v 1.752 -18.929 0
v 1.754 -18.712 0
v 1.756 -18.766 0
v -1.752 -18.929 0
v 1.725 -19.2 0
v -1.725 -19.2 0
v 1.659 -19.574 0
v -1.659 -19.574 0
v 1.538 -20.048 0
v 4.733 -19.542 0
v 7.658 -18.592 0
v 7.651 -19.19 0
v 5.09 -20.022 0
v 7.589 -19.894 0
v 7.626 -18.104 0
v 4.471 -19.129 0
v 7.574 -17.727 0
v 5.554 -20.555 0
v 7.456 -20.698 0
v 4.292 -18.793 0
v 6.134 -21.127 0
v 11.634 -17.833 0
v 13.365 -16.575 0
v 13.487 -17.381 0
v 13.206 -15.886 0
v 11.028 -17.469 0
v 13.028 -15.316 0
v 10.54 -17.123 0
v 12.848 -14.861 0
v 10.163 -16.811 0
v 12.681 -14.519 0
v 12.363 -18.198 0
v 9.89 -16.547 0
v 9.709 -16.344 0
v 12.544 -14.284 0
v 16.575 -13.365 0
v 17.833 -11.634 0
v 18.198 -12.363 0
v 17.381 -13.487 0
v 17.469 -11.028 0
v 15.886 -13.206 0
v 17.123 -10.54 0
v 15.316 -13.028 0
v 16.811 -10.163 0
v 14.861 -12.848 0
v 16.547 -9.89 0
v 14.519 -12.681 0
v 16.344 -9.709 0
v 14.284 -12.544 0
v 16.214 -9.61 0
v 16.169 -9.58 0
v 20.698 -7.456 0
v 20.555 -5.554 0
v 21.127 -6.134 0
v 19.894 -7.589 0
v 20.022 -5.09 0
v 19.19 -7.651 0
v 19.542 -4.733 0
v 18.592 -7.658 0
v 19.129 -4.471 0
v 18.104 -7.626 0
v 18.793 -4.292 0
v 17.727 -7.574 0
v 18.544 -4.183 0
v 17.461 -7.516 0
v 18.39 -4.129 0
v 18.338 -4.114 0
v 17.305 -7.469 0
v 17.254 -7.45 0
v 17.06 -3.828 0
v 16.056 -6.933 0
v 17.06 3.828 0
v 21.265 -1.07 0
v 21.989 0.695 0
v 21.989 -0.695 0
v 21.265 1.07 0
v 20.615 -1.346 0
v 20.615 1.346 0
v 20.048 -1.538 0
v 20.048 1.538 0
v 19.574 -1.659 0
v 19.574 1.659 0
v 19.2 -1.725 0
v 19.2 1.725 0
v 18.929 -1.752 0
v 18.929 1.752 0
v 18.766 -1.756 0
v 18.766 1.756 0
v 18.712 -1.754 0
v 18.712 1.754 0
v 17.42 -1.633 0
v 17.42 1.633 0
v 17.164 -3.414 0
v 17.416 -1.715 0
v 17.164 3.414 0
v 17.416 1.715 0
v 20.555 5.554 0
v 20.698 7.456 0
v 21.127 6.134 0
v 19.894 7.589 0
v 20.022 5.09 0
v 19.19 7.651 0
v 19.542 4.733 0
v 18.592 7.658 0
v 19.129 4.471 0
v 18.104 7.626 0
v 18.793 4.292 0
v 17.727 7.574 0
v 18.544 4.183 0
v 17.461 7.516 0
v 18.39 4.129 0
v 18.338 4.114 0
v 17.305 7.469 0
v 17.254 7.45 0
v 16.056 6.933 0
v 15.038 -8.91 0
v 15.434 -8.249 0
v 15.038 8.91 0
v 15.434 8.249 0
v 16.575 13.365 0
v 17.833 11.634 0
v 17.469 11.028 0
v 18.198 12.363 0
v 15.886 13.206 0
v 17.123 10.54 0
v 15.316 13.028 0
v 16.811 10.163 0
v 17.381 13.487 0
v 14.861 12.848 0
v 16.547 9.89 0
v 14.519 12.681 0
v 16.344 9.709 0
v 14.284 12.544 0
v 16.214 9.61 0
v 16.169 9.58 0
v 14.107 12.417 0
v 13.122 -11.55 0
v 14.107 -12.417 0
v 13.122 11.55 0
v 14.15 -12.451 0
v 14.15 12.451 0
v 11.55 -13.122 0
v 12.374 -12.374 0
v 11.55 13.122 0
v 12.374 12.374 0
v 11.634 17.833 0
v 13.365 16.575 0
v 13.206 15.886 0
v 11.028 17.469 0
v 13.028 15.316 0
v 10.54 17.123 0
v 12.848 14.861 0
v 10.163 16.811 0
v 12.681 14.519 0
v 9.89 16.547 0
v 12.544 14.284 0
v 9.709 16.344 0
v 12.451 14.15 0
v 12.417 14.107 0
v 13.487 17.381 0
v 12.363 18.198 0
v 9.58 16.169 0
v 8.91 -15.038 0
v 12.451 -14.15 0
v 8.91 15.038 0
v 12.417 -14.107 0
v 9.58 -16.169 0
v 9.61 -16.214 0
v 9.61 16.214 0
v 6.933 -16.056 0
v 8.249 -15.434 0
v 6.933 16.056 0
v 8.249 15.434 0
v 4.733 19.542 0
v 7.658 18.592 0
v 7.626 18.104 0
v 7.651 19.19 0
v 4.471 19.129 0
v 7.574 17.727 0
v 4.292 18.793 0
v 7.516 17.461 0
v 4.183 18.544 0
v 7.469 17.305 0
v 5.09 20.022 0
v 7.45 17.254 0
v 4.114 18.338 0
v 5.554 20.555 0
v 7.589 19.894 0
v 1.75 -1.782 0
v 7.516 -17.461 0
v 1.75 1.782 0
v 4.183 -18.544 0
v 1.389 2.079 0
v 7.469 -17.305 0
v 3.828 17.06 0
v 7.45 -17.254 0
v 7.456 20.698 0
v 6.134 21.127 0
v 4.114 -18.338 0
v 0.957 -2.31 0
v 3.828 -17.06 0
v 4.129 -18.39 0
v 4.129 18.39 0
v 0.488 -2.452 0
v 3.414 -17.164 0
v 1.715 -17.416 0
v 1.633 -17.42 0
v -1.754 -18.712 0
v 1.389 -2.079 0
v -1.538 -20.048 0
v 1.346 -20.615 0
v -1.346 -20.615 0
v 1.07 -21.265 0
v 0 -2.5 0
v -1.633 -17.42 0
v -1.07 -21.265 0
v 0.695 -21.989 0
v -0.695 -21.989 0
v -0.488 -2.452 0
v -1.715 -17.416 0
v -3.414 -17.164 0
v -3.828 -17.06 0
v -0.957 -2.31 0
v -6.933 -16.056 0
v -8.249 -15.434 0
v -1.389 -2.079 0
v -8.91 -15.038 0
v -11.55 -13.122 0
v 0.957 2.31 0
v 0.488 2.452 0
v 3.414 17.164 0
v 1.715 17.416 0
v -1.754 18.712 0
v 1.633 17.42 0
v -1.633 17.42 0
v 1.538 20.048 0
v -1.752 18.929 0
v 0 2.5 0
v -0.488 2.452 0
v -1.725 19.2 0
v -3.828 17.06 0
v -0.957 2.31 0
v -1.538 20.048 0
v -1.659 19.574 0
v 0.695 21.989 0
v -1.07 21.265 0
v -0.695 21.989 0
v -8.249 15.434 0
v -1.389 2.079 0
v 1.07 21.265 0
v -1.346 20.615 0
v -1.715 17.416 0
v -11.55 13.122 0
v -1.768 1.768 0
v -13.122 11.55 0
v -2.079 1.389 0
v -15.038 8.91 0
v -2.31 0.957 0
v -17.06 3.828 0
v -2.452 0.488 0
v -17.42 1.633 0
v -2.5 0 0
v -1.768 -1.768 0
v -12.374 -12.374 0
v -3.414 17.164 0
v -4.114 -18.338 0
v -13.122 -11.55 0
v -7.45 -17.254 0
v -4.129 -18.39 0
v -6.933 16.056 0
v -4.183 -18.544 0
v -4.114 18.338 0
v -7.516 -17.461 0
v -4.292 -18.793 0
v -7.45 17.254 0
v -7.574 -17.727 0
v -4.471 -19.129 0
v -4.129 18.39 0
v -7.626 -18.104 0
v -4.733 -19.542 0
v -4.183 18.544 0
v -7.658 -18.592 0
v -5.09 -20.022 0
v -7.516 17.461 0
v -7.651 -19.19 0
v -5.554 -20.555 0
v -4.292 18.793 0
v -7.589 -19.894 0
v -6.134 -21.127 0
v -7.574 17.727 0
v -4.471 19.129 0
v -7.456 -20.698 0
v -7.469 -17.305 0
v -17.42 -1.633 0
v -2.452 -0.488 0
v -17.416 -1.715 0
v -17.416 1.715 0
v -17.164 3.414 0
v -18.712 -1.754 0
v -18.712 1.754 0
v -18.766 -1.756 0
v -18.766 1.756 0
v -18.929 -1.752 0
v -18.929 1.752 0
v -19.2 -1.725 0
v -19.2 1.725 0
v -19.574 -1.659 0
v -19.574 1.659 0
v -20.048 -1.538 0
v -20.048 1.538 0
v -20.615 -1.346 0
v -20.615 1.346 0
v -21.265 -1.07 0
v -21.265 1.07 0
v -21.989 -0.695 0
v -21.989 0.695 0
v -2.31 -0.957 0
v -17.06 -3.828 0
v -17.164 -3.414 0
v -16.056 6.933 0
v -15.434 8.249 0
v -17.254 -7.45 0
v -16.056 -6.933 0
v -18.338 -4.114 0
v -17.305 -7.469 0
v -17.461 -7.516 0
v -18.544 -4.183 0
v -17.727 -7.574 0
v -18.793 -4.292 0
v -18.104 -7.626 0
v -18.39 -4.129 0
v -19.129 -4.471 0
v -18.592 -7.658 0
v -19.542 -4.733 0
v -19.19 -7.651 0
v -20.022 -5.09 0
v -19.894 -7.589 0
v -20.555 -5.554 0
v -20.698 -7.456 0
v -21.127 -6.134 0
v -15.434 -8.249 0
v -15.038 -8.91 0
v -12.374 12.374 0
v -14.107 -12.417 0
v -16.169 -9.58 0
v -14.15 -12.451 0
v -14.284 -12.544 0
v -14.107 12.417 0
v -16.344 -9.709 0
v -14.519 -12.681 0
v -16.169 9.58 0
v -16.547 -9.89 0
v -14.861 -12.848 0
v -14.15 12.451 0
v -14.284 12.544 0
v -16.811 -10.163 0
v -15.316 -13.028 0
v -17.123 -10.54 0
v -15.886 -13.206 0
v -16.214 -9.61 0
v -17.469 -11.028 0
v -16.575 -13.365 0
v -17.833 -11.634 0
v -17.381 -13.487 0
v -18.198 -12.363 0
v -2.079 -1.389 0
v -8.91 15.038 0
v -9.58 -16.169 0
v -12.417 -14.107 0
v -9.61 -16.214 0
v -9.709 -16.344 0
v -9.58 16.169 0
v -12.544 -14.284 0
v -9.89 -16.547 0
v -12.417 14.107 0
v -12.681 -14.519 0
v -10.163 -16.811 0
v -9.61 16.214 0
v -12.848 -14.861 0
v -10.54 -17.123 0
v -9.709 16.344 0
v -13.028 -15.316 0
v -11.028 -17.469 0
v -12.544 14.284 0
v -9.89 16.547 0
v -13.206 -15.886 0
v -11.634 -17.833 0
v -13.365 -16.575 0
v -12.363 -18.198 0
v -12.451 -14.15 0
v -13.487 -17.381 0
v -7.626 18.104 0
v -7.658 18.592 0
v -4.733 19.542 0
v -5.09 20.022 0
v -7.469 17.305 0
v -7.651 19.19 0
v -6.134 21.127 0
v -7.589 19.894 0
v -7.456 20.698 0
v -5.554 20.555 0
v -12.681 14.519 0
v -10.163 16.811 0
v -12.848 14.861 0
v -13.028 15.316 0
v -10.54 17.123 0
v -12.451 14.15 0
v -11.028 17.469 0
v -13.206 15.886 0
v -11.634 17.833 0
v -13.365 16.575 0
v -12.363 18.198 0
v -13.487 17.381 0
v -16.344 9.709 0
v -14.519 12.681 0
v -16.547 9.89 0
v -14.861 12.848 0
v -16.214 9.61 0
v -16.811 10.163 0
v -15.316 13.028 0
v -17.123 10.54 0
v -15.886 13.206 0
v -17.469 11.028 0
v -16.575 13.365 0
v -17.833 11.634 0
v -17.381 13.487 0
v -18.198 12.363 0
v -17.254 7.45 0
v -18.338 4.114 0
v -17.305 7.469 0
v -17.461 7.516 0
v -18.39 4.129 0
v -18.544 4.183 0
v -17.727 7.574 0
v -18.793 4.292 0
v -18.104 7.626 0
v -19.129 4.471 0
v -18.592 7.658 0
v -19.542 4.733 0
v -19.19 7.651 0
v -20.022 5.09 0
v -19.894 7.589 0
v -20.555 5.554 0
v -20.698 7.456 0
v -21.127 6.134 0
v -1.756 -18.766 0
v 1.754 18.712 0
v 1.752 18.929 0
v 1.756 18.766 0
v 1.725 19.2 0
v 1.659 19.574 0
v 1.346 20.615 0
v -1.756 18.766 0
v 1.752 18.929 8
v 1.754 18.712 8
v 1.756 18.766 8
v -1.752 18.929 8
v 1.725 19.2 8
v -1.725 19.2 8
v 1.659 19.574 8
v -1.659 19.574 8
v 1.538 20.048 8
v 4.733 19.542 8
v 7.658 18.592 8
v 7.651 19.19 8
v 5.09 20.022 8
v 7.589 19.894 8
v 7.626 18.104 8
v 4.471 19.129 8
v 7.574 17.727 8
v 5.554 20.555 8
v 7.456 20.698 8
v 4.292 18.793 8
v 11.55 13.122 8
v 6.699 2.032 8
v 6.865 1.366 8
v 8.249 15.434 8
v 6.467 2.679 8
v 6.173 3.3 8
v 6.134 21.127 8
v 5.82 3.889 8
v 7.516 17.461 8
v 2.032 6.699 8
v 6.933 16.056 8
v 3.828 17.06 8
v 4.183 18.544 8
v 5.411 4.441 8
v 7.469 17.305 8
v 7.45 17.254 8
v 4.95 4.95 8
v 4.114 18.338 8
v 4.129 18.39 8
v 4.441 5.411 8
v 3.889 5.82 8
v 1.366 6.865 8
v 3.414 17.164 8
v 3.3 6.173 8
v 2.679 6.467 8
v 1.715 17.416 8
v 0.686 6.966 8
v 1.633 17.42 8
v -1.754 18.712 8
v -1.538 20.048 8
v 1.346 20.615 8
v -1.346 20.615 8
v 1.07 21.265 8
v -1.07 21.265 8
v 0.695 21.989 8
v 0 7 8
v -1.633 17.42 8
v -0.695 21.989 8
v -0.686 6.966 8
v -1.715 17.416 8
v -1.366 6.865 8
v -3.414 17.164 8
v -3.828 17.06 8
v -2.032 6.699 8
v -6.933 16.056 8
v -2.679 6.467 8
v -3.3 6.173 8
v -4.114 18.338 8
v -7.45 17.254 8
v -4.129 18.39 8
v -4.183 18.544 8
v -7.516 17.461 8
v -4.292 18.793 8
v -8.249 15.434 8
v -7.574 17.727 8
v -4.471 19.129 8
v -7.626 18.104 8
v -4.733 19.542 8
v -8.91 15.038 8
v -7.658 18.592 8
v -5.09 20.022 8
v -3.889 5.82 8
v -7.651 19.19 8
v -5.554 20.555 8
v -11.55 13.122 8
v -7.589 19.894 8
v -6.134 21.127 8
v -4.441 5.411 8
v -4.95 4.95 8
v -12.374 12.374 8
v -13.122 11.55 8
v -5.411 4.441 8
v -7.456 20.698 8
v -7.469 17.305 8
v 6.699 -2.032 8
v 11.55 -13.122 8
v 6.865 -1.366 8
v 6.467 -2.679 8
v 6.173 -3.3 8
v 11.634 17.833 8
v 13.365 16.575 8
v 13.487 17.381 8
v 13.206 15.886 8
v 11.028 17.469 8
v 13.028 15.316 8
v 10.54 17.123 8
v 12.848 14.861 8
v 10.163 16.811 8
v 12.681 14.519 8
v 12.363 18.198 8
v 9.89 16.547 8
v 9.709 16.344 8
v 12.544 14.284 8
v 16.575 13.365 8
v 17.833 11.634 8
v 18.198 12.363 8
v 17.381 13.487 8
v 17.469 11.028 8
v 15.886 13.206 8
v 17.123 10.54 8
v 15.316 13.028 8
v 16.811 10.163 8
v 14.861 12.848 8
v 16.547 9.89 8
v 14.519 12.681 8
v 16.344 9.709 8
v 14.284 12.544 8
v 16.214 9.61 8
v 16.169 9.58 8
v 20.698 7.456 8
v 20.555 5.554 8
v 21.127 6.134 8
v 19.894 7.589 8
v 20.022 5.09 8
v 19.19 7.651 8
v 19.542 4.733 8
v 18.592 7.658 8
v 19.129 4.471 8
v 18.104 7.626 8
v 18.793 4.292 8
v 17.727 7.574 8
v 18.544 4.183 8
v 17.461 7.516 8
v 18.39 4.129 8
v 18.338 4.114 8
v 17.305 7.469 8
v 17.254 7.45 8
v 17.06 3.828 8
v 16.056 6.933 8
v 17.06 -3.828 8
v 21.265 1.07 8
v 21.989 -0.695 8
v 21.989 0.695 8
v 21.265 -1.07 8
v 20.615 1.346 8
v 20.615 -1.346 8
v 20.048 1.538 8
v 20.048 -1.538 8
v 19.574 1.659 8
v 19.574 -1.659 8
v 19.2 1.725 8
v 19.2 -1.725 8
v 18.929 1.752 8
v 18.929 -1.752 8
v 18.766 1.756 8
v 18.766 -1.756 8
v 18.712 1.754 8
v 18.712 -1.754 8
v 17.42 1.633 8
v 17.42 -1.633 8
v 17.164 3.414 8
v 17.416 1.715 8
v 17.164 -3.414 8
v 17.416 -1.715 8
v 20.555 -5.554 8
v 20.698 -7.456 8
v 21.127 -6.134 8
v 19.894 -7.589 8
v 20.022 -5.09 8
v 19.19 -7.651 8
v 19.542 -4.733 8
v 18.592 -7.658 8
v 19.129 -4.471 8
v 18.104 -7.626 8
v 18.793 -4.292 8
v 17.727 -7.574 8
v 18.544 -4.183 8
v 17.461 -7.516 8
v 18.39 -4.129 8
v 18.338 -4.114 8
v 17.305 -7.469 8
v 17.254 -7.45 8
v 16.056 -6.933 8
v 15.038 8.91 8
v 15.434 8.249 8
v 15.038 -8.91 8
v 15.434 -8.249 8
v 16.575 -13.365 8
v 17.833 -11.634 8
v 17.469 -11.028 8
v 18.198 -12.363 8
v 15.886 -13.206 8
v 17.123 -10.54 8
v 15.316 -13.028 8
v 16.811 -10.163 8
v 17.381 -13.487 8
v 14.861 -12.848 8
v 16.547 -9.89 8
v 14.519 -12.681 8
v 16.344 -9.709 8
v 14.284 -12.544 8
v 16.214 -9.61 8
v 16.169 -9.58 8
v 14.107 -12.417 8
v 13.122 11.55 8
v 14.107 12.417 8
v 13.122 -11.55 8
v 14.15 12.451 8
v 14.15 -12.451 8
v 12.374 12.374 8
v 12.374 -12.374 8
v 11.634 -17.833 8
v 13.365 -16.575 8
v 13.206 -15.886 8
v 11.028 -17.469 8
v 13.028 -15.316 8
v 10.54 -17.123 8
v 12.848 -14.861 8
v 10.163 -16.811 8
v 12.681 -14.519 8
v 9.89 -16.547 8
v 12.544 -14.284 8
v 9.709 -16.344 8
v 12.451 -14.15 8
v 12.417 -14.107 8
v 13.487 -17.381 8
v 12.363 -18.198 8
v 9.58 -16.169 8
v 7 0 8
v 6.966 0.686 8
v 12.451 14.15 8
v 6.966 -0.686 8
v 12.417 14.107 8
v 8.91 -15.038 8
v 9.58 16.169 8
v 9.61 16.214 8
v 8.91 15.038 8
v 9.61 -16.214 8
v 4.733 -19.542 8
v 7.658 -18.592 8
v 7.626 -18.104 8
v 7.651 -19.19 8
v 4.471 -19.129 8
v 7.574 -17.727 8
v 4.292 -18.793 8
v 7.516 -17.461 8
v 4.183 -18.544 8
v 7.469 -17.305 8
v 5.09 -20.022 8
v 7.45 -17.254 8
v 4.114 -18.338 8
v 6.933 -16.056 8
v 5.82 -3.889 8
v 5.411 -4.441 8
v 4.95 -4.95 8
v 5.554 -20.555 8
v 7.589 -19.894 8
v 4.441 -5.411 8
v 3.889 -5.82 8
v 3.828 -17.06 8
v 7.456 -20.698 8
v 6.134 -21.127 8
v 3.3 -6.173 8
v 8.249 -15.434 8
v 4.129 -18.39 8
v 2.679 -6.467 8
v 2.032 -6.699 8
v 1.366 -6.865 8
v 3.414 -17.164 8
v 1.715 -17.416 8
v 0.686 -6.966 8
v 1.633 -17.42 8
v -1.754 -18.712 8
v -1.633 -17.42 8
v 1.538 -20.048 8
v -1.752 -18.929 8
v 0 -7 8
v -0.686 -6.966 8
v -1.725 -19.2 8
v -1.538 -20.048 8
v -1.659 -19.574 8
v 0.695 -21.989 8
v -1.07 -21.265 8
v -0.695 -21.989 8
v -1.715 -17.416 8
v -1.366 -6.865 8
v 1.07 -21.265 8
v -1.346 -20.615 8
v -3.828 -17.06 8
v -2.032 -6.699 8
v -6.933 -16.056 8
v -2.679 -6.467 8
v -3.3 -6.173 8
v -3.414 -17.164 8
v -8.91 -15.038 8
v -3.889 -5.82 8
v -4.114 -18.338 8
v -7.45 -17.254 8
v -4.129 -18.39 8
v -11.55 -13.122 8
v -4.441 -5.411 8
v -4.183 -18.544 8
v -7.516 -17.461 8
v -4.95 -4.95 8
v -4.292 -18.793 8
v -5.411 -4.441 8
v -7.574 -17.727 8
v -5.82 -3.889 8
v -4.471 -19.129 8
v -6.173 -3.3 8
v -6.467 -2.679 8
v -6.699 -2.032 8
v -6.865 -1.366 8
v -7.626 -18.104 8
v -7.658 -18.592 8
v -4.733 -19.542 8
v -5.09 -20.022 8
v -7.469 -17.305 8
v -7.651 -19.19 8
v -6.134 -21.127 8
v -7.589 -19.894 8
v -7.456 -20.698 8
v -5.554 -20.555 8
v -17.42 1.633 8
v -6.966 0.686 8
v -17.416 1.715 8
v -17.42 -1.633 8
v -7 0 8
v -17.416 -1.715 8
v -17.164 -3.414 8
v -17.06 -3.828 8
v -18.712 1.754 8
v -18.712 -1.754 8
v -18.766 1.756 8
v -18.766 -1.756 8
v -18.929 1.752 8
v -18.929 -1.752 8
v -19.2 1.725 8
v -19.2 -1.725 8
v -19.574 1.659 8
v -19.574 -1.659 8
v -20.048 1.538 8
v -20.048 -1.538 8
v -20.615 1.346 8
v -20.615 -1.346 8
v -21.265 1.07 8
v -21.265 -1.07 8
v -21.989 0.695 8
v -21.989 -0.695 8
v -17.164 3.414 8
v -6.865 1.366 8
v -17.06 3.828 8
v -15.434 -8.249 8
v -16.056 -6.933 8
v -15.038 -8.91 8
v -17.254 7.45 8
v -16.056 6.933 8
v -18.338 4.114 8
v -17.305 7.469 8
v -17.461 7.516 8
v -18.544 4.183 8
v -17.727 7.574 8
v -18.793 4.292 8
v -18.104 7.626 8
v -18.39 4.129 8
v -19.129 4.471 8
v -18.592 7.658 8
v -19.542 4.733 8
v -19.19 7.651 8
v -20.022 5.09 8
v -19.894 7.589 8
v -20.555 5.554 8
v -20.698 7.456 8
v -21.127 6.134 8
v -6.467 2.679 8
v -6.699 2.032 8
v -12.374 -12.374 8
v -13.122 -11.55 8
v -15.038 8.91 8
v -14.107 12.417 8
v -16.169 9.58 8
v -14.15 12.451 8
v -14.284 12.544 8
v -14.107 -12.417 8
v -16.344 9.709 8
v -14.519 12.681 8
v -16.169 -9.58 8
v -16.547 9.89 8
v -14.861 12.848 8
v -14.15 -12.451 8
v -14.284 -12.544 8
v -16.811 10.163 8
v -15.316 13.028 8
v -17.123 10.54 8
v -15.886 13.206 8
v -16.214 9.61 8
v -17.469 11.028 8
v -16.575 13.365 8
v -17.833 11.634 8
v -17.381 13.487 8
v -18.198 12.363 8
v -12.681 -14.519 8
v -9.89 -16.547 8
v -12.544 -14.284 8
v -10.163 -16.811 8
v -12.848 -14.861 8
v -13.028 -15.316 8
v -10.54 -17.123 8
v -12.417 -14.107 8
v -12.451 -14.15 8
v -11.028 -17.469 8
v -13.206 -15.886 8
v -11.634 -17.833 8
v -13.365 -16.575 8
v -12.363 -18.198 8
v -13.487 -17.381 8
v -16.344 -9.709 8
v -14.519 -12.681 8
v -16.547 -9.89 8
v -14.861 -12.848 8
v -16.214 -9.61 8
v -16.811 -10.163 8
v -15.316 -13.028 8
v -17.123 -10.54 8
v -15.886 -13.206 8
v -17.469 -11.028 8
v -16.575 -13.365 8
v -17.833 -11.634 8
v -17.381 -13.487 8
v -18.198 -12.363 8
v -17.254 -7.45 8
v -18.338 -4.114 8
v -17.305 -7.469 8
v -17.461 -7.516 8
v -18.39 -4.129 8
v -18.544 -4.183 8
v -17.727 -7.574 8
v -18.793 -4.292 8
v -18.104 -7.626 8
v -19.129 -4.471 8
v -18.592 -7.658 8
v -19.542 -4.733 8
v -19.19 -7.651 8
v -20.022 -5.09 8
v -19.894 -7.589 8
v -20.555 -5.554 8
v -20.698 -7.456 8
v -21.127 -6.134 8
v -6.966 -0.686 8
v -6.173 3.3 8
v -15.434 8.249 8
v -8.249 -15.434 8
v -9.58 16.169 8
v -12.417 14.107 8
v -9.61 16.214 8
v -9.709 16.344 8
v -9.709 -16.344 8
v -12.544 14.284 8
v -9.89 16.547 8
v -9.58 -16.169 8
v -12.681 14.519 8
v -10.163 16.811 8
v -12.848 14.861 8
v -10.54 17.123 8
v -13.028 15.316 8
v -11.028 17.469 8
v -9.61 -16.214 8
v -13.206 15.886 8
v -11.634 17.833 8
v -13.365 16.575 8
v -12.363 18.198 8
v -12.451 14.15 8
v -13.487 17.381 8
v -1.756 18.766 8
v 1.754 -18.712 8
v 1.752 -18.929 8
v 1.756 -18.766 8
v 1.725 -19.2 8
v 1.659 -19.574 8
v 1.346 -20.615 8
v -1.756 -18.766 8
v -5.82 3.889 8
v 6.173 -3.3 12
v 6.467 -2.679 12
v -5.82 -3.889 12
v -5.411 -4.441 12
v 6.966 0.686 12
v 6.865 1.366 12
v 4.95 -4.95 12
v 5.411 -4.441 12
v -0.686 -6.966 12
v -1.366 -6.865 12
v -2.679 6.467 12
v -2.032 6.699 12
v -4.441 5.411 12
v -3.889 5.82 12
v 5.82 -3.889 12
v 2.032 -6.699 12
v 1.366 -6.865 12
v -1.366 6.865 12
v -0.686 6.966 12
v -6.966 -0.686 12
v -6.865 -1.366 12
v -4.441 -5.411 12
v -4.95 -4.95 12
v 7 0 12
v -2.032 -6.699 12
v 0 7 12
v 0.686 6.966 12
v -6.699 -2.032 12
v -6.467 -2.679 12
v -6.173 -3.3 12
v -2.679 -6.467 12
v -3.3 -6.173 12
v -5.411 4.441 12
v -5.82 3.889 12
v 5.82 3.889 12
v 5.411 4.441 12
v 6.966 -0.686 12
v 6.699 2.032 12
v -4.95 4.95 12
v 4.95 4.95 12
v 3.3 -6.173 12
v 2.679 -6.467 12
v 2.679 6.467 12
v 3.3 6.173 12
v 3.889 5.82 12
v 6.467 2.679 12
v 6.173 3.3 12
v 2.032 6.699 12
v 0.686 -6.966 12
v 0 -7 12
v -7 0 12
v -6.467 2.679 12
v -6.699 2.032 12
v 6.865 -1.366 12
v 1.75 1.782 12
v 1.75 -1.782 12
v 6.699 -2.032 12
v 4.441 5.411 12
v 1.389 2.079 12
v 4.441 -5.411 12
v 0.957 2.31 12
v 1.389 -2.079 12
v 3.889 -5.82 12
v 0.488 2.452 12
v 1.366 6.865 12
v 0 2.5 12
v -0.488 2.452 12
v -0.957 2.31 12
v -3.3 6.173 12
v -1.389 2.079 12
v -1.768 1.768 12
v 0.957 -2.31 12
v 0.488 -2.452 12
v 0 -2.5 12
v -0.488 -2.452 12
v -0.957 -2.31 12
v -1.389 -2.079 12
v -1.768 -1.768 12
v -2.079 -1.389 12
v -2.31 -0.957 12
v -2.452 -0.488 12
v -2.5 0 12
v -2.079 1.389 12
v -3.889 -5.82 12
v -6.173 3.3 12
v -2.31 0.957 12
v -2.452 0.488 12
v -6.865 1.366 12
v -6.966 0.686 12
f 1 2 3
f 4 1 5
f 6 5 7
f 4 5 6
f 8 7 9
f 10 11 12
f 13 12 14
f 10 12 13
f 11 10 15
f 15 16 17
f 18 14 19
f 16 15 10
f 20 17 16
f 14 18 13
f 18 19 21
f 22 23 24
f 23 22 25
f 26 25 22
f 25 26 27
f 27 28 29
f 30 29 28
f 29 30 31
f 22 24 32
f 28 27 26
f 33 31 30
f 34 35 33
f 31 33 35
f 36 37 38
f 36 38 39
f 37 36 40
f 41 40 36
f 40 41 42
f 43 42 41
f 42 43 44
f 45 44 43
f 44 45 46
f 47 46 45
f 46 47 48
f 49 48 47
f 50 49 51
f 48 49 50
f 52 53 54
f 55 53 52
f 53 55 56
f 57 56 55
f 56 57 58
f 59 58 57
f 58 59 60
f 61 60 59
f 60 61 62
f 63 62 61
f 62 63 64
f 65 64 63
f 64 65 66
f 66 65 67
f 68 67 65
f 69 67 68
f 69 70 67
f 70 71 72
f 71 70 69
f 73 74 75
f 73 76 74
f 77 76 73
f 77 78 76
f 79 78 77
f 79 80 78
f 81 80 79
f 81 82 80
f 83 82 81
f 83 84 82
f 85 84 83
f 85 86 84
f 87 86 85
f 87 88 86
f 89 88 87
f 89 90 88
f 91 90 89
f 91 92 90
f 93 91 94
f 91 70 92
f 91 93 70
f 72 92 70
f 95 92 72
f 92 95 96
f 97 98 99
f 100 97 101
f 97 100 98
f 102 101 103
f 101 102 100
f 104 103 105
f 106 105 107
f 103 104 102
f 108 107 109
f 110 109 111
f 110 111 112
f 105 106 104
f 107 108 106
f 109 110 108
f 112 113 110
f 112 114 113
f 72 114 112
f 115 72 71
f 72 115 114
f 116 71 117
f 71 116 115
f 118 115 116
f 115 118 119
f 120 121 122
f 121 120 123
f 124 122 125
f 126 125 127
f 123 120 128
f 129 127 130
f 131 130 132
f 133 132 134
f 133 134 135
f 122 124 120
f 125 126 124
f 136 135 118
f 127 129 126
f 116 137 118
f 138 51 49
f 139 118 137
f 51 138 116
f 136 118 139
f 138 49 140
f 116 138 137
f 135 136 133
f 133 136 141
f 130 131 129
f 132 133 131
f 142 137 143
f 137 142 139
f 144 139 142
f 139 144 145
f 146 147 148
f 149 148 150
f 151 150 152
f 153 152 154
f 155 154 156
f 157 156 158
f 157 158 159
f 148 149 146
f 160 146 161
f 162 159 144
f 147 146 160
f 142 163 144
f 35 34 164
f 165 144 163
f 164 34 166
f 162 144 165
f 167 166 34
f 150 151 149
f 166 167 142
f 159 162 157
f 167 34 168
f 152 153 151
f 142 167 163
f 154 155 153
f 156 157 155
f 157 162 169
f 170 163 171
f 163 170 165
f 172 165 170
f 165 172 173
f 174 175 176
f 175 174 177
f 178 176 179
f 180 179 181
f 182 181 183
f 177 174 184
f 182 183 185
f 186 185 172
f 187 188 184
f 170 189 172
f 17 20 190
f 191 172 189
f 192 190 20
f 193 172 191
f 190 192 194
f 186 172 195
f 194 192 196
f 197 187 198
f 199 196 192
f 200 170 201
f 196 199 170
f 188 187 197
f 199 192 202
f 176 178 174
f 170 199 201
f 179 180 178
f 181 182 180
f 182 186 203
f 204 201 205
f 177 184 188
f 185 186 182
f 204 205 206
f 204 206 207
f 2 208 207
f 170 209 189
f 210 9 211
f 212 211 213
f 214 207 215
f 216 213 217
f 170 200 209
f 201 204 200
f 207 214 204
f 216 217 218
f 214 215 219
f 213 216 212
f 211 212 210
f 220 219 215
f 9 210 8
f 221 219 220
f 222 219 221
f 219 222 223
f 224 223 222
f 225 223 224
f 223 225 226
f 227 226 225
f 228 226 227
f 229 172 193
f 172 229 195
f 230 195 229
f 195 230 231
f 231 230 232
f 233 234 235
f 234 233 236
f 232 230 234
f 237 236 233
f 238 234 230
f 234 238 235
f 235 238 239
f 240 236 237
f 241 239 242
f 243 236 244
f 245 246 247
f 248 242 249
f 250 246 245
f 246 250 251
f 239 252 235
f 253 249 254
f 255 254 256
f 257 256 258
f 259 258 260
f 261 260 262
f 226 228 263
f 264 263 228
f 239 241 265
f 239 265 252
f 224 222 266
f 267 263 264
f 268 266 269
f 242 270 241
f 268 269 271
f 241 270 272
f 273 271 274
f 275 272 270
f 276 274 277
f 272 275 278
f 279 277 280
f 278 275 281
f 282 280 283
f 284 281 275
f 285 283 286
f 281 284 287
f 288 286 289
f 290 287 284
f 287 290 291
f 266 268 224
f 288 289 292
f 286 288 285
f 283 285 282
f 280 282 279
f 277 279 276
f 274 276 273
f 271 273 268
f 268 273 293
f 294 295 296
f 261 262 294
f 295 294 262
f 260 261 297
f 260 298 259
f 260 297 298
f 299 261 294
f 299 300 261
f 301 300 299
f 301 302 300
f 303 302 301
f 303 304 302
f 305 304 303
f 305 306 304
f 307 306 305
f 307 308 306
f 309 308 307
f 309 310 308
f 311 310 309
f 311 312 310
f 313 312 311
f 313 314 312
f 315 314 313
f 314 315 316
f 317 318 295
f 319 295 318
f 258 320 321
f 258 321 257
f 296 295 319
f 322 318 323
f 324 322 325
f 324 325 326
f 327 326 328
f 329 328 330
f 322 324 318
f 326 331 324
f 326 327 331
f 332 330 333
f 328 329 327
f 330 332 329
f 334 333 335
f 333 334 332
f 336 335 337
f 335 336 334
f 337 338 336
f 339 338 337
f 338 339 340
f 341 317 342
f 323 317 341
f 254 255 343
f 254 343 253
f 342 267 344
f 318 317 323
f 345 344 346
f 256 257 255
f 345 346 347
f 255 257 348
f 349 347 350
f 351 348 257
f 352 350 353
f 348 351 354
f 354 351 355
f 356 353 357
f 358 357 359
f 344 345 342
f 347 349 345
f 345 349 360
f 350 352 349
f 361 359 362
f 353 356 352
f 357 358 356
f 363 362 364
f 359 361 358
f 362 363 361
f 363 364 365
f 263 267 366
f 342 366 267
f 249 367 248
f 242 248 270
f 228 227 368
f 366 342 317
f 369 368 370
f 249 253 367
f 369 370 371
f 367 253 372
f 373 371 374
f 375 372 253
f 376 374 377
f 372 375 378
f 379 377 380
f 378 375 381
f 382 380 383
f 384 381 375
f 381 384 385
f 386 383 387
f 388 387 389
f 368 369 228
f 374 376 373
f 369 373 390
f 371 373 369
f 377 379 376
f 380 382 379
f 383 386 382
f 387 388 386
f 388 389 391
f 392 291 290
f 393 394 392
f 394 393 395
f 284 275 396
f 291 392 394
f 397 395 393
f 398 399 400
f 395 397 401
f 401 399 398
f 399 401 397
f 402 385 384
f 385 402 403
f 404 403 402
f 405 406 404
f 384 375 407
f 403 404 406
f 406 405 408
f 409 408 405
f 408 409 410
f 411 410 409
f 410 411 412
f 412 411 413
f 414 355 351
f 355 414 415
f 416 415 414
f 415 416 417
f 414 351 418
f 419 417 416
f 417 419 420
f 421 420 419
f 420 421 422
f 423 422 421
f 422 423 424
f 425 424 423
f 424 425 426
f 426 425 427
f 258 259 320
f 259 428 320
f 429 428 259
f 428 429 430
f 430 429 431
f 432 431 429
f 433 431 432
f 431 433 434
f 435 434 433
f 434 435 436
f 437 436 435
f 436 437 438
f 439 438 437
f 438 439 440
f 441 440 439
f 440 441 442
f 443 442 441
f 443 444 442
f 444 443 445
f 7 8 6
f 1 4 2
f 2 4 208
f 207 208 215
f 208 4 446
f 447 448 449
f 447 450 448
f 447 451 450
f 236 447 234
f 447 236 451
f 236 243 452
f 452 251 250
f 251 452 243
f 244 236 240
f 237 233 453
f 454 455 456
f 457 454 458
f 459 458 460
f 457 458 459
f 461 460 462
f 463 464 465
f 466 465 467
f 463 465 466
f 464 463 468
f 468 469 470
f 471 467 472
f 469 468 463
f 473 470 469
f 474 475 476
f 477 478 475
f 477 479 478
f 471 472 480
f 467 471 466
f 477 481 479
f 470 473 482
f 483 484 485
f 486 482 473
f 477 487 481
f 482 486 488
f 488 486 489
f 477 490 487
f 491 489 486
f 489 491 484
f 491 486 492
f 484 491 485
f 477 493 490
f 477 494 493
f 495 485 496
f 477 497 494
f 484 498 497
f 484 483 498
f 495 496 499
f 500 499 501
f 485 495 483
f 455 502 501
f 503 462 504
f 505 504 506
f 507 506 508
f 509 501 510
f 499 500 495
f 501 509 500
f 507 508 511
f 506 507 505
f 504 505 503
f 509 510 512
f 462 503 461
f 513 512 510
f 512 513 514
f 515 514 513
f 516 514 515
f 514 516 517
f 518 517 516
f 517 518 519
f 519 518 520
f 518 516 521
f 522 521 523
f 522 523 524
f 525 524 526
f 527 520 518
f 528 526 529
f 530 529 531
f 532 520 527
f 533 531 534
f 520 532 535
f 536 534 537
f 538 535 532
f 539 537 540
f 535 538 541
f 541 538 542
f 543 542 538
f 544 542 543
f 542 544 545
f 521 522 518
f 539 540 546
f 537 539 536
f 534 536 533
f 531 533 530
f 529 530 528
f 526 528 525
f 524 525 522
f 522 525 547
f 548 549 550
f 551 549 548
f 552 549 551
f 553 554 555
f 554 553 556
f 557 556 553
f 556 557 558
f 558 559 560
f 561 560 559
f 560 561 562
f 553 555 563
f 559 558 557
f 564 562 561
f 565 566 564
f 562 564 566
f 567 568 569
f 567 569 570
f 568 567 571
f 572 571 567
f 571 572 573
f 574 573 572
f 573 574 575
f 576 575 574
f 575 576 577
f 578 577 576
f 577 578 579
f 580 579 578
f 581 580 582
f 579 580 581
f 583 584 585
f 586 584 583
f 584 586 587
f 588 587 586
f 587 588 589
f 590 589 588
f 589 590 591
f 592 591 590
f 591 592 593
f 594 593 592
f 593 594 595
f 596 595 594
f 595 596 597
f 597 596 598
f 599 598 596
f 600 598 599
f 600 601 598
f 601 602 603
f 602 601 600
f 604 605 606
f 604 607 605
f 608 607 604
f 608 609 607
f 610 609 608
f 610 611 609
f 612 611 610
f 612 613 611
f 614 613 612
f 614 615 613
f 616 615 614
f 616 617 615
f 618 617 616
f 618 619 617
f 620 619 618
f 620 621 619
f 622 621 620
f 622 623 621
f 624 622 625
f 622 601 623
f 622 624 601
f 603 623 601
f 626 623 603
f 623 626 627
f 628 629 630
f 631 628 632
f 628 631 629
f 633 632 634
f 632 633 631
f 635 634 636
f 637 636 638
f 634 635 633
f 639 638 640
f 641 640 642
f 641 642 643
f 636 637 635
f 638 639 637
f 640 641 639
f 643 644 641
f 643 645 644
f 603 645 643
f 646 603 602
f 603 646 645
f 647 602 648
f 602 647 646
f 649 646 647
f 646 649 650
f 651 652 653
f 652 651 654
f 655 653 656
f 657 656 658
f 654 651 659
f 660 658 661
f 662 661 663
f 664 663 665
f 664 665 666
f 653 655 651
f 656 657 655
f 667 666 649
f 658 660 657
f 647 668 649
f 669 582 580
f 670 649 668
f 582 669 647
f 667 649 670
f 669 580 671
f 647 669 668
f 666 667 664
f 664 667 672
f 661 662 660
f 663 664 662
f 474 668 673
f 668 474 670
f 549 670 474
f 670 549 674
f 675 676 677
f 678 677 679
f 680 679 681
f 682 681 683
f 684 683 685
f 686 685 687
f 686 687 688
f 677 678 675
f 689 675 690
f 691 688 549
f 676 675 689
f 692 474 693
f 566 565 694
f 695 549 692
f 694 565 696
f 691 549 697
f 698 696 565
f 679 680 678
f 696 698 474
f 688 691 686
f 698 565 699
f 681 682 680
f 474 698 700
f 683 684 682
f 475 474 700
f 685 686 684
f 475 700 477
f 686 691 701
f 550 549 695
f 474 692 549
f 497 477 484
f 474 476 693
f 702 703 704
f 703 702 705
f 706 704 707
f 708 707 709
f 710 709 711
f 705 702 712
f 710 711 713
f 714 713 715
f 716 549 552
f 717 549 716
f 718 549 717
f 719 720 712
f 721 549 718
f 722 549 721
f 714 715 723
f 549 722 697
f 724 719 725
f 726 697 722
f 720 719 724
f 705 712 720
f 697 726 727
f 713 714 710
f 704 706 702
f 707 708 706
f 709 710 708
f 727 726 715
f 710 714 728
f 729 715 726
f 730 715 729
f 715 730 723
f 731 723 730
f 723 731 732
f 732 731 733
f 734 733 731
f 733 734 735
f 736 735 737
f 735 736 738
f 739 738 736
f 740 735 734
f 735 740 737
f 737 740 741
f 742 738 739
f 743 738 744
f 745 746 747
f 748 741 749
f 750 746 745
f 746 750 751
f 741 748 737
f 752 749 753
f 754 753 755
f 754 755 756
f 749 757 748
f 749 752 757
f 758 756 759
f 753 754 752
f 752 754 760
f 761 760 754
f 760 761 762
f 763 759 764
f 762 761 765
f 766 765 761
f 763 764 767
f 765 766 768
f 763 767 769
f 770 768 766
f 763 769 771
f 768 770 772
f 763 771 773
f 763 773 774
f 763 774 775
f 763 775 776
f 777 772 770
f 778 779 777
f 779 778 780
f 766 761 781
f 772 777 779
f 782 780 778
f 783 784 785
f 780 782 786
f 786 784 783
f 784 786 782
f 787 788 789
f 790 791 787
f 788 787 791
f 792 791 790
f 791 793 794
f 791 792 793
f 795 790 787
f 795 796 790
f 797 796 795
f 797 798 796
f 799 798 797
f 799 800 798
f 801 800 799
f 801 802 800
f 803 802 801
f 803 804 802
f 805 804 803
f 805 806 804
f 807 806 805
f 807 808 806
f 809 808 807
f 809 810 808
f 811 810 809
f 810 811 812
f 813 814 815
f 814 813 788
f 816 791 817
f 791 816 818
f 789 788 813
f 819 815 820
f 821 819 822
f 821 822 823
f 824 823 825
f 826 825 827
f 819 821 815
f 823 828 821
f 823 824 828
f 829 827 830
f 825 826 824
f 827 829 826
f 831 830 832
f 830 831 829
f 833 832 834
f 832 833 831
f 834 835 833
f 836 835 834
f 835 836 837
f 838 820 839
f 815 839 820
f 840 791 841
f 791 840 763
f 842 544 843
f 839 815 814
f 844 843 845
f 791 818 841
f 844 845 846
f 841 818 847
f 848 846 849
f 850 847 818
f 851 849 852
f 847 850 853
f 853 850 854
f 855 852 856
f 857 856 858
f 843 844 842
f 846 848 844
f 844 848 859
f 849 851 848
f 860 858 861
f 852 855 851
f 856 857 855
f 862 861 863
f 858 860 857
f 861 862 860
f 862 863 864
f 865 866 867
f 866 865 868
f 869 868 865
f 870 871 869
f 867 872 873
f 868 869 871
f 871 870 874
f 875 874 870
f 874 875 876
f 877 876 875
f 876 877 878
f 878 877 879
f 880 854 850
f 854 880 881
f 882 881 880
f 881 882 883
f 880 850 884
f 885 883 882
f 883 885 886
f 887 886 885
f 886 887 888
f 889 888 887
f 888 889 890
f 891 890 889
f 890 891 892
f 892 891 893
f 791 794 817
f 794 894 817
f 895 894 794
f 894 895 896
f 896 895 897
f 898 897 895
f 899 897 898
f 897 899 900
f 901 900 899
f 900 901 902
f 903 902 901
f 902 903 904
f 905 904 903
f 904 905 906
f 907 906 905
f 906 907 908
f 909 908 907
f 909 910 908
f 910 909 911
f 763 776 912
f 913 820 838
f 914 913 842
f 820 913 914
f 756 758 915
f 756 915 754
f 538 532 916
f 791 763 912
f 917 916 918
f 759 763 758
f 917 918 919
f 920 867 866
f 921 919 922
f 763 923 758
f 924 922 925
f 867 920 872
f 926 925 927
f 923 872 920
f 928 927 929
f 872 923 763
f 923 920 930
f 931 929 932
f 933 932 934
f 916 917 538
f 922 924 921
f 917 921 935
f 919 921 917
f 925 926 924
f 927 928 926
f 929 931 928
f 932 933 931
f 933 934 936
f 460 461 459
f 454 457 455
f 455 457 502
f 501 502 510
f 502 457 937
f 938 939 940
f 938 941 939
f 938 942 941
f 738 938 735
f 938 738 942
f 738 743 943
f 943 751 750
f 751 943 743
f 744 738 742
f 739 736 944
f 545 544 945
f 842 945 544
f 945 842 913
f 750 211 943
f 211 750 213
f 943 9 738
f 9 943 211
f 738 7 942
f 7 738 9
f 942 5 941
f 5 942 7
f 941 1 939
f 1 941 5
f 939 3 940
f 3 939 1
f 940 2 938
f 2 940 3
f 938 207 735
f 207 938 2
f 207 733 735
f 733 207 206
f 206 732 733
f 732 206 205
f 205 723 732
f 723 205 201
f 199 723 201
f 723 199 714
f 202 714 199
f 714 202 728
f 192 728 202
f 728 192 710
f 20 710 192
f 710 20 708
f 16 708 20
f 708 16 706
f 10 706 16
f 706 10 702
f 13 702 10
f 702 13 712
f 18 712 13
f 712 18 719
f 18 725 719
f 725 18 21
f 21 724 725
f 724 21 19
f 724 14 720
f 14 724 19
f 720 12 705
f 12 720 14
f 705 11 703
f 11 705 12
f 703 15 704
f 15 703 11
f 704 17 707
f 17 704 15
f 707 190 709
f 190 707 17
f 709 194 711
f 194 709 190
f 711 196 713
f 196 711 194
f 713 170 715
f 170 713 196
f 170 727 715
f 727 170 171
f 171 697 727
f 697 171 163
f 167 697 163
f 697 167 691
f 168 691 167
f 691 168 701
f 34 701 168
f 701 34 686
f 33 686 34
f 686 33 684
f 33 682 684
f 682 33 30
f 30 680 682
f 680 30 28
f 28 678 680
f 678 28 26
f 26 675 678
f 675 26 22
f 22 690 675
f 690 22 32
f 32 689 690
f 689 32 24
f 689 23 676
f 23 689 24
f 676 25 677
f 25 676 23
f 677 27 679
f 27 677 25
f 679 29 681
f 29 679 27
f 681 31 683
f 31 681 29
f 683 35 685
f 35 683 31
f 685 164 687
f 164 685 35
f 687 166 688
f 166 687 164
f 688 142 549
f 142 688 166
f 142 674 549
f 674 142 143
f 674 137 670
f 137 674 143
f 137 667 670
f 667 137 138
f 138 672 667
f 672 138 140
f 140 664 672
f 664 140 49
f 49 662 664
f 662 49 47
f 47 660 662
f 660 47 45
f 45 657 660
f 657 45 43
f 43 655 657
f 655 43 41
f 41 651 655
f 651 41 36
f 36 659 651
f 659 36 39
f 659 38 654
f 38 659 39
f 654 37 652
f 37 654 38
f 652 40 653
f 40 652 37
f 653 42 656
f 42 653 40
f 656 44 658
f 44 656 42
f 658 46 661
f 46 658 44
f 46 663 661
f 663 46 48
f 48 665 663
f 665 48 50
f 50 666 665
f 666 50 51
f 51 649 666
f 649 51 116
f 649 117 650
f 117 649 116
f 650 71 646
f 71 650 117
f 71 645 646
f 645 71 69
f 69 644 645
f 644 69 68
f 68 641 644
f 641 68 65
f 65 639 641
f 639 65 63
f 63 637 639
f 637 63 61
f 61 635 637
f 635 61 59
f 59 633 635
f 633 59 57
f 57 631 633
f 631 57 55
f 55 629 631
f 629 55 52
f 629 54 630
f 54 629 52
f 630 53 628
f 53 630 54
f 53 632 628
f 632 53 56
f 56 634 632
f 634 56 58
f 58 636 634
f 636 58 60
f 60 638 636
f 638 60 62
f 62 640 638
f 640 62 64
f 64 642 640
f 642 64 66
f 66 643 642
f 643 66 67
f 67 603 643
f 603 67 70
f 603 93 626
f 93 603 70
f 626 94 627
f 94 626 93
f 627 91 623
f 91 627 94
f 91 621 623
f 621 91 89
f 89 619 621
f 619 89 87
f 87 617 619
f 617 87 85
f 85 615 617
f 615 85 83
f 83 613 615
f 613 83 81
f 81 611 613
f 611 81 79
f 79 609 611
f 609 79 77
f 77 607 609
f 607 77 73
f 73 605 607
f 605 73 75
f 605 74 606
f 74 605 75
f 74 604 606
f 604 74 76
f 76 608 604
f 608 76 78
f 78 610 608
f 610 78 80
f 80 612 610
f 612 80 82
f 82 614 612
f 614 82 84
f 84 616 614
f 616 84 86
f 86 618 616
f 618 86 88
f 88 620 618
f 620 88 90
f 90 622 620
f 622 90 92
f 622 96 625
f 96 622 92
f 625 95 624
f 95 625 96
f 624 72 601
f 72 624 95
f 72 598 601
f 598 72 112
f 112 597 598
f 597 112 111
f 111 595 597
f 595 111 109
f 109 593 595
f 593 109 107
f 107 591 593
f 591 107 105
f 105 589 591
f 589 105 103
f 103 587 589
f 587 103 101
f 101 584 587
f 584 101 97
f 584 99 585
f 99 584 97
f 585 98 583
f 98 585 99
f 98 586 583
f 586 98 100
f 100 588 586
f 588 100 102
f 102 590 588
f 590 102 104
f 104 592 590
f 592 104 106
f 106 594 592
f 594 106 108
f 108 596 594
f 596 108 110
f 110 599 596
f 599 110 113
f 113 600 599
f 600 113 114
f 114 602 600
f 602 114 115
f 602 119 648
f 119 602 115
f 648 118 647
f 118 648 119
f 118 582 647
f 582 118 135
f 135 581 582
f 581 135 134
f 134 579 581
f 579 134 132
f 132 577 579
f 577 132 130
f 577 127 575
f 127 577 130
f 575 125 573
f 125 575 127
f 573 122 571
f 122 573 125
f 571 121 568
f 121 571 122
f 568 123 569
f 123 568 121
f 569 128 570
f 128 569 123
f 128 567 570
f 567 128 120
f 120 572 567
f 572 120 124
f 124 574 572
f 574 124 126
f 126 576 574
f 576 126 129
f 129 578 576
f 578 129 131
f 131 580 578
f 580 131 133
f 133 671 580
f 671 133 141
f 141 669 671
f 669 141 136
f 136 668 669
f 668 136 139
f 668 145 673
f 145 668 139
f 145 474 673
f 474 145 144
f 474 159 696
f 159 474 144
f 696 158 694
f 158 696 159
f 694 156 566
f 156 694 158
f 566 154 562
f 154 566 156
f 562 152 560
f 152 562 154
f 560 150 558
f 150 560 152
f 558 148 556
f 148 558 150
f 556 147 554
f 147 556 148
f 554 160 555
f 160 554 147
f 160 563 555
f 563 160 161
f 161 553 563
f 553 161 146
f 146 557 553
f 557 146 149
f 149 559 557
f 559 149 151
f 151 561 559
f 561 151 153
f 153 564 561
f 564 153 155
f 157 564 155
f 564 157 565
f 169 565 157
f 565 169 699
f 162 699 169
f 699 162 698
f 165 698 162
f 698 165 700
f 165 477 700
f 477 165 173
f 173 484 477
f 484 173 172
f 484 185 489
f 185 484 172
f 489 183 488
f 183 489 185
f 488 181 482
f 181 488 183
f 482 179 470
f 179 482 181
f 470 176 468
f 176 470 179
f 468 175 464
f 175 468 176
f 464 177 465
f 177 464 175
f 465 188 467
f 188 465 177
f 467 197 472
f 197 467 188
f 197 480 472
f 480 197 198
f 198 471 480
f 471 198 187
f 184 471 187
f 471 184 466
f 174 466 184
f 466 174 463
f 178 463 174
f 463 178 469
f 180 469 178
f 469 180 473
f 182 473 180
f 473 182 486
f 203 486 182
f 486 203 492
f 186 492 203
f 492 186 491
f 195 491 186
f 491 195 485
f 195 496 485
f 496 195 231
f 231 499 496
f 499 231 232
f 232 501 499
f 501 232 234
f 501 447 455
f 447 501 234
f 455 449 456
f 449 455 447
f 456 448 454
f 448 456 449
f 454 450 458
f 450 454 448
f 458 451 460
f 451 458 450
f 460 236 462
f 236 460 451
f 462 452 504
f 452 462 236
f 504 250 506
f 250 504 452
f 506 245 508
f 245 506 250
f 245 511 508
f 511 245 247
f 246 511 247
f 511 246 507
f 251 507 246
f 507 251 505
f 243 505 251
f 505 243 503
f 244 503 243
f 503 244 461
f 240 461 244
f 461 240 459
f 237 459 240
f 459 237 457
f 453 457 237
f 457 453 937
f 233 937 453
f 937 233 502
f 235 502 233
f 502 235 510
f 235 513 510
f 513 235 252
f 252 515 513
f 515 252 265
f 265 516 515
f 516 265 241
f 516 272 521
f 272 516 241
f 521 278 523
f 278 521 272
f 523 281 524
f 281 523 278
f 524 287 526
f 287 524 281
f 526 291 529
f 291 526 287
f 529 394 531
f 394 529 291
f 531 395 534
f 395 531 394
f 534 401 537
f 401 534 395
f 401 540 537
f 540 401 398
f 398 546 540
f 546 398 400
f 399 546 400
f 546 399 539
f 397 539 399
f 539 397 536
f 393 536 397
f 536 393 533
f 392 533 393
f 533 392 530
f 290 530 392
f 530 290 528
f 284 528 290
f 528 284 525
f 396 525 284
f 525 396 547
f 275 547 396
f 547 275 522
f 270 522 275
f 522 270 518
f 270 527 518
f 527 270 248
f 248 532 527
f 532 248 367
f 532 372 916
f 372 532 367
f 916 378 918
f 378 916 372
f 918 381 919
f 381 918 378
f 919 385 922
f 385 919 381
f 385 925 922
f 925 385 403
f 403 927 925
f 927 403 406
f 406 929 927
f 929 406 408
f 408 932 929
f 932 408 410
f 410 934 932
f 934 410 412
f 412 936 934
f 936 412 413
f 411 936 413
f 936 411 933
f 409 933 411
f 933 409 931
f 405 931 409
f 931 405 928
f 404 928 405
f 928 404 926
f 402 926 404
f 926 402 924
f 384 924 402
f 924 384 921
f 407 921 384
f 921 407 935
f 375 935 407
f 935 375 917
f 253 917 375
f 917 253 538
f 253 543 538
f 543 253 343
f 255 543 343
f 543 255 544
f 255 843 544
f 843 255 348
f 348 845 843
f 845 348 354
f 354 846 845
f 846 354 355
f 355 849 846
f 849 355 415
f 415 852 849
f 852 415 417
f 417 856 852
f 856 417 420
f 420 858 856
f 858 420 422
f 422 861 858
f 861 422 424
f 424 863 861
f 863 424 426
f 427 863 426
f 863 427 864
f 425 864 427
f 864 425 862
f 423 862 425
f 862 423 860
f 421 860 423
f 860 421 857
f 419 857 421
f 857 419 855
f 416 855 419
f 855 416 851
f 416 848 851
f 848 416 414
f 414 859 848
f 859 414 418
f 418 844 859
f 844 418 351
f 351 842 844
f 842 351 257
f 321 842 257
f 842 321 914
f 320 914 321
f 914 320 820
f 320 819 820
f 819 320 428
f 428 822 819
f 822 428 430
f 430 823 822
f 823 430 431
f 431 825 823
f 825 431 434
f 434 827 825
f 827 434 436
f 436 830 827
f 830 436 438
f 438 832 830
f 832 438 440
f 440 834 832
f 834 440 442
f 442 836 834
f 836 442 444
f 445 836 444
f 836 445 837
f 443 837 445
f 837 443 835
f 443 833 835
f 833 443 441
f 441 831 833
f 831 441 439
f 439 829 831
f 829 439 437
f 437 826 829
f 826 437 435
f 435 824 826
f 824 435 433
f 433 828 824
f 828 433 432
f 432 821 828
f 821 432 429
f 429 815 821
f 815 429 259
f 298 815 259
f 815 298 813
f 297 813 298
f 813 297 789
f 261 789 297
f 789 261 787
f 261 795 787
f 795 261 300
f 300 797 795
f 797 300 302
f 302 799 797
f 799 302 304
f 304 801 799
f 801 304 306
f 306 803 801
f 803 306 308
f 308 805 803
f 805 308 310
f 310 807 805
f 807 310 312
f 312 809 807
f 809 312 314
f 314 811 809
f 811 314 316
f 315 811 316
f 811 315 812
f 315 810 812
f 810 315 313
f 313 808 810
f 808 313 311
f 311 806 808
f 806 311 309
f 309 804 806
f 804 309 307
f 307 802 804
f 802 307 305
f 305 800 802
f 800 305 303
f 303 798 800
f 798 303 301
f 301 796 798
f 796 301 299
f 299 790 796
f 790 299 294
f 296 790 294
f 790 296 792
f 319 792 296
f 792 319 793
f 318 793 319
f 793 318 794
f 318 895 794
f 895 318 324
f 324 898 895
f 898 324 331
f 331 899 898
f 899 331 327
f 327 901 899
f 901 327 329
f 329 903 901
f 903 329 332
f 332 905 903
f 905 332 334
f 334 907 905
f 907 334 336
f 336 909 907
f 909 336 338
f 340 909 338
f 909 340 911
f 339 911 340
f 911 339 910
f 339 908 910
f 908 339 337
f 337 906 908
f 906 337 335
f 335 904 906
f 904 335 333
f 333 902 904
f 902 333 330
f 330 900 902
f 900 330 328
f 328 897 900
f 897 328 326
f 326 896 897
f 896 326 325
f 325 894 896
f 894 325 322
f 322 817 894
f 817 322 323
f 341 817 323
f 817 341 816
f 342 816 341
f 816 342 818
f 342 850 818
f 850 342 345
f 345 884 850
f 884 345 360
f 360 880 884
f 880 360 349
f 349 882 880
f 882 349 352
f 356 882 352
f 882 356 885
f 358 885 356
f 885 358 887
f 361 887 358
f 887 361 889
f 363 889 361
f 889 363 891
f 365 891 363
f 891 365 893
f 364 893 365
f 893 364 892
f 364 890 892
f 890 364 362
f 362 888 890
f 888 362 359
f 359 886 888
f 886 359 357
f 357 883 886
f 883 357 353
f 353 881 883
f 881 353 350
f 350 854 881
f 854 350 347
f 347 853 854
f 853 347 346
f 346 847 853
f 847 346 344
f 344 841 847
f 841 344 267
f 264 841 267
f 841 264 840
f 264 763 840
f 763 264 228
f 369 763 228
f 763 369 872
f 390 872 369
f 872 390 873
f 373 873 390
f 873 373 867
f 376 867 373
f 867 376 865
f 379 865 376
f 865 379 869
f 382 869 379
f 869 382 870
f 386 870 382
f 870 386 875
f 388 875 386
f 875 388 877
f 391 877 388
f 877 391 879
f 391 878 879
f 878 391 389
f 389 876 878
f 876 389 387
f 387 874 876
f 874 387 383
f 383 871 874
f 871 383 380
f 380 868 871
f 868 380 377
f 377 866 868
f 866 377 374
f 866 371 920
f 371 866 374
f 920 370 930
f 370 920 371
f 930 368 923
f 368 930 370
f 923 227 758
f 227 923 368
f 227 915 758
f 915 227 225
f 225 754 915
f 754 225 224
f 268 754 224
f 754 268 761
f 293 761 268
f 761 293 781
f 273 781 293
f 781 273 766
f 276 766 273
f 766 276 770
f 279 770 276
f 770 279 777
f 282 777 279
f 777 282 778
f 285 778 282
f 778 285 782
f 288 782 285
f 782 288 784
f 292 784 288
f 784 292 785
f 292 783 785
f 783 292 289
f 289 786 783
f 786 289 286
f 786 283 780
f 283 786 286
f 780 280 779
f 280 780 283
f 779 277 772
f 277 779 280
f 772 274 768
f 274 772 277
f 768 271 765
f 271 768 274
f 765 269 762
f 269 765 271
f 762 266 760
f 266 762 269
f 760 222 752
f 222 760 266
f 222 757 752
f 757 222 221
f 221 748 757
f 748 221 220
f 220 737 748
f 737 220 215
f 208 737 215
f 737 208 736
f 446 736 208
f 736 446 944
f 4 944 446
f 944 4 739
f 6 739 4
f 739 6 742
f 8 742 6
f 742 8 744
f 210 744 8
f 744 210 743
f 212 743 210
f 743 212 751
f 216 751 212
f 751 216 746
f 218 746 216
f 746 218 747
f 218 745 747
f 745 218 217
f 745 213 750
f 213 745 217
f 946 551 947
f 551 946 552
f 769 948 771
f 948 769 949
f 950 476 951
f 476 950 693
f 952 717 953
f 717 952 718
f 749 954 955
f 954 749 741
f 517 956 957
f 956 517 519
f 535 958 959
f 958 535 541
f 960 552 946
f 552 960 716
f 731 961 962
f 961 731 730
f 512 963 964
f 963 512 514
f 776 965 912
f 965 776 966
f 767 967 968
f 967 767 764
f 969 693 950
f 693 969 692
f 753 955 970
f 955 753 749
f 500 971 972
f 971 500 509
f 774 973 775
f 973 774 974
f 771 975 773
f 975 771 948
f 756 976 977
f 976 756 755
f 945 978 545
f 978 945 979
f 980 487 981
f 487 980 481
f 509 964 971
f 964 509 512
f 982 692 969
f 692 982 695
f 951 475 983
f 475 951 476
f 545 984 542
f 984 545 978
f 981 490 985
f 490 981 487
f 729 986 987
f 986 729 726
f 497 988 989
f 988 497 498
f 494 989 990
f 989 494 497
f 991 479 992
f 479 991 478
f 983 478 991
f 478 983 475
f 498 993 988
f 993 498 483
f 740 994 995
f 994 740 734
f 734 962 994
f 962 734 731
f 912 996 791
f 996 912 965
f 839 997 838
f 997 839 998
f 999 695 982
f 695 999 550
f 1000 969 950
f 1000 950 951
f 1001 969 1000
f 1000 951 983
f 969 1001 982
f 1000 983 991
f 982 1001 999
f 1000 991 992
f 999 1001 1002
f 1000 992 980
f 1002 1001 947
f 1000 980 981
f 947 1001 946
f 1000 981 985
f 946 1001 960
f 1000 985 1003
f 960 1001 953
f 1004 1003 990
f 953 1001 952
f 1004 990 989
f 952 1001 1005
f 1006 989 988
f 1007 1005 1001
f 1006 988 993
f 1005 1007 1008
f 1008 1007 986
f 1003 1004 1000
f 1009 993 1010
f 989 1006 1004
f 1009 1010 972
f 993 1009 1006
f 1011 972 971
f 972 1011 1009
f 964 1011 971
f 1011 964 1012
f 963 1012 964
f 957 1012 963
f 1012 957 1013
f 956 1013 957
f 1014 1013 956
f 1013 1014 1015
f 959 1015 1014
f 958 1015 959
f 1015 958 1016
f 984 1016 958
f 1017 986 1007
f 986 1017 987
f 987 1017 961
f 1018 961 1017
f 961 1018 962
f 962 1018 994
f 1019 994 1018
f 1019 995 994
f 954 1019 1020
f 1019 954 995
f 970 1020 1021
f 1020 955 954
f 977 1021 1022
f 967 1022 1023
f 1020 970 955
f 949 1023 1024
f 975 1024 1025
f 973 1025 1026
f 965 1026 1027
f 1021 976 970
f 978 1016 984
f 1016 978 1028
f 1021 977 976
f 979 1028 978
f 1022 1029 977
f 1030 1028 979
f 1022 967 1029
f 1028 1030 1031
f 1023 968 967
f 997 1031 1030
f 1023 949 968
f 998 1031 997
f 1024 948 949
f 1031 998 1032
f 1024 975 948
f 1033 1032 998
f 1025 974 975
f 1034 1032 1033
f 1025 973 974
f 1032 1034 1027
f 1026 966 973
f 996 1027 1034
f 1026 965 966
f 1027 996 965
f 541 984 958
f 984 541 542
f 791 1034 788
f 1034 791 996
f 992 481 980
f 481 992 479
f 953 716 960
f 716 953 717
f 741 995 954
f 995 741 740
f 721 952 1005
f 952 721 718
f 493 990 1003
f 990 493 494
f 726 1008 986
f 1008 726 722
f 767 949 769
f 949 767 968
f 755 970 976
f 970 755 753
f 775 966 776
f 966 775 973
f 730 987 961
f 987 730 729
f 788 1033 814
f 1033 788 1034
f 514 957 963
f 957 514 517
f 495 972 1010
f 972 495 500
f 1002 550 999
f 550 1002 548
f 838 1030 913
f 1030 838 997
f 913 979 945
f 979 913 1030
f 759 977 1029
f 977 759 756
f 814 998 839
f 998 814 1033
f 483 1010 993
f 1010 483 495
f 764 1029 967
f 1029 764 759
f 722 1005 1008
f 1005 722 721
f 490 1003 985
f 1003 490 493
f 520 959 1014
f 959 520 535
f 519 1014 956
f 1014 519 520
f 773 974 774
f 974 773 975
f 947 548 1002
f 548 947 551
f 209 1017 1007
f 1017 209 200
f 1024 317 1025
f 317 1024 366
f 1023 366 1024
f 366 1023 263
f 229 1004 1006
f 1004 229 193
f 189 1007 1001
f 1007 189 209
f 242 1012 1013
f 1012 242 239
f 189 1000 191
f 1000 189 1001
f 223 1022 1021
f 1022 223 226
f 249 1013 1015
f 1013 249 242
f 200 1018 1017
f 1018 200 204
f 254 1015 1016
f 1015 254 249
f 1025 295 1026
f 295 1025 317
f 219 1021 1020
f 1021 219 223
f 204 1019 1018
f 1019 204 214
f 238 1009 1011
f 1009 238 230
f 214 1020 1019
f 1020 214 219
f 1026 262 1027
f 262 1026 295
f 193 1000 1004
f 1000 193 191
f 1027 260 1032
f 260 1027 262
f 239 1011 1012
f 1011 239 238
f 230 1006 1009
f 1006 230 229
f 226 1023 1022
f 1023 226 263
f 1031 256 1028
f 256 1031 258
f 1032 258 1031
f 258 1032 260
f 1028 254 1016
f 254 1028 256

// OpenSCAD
// Прямозубая шестерня с эвольвентным профилем: две шестерни одного
// модуля сцепляются, межосевое расстояние = модуль × (z1 + z2) / 2.
$fn = 64;

/* [Шестерня] */
// Число зубьев
teeth = 20;             // [8:1:80]
// Модуль, мм
mod = 2;                // [0.5:0.25:5]
// Толщина, мм
thickness = 8;          // [2:0.5:30]
// Угол зацепления, °
pressure_angle = 20;    // [14.5:0.5:25]
/* [Ступица] */
// Диаметр вала, мм
bore = 5;               // [0:0.5:30]
// Лыска на валу (D-профиль)
d_flat = true;
// Диаметр ступицы, мм
hub_diameter = 14;      // [0:1:60]
// Высота ступицы над колесом, мм
hub_height = 4;         // [0:0.5:30]

pitch_r = mod * teeth / 2;
base_r = pitch_r * cos(pressure_angle);
tip_r = pitch_r + mod;
root_r = pitch_r - 1.25 * mod;
// Половина угла зуба на основной окружности, в градусах.
half = 90 / teeth + (tan(pressure_angle) - pressure_angle * PI / 180) * 180 / PI;

// Точка эвольвенты: параметр t (рад) → радиус и угол развёртки.
function inv_r(t) = base_r * sqrt(1 + t * t);
function inv_a(t) = t * 180 / PI - atan(t);
function t_at(r) = sqrt(max(0, pow(r / base_r, 2) - 1));
function polar(r, a) = [r * cos(a), r * sin(a)];

module tooth() {
    t0 = t_at(max(base_r, root_r));
    t1 = t_at(tip_r);
    flank = [for (i = [0 : 8]) let (t = t0 + (t1 - t0) * i / 8) polar(inv_r(t), inv_a(t) - half)];
    polygon(concat(
        [polar(root_r - mod / 2, -half)],
        flank,
        [for (i = [8 : -1 : 0]) [flank[i][0], -flank[i][1]]],
        [polar(root_r - mod / 2, half)]
    ));
}

module gear2d() {
    union() {
        circle(r = root_r);
        for (i = [0 : teeth - 1]) rotate(i * 360 / teeth) tooth();
    }
}

module bore2d() {
    if (bore > 0)
        difference() {
            circle(d = bore, $fn = 32);
            if (d_flat) translate([bore / 2 - bore * 0.15, -bore]) square([bore, 2 * bore]);
        }
}

difference() {
    union() {
        linear_extrude(height = thickness) gear2d();
        if (hub_height > 0 && hub_diameter > bore)
            cylinder(h = thickness + hub_height, d = min(hub_diameter, 2 * root_r - 2));
    }
    translate([0, 0, -1]) linear_extrude(height = thickness + hub_height + 2) bore2d();
}
